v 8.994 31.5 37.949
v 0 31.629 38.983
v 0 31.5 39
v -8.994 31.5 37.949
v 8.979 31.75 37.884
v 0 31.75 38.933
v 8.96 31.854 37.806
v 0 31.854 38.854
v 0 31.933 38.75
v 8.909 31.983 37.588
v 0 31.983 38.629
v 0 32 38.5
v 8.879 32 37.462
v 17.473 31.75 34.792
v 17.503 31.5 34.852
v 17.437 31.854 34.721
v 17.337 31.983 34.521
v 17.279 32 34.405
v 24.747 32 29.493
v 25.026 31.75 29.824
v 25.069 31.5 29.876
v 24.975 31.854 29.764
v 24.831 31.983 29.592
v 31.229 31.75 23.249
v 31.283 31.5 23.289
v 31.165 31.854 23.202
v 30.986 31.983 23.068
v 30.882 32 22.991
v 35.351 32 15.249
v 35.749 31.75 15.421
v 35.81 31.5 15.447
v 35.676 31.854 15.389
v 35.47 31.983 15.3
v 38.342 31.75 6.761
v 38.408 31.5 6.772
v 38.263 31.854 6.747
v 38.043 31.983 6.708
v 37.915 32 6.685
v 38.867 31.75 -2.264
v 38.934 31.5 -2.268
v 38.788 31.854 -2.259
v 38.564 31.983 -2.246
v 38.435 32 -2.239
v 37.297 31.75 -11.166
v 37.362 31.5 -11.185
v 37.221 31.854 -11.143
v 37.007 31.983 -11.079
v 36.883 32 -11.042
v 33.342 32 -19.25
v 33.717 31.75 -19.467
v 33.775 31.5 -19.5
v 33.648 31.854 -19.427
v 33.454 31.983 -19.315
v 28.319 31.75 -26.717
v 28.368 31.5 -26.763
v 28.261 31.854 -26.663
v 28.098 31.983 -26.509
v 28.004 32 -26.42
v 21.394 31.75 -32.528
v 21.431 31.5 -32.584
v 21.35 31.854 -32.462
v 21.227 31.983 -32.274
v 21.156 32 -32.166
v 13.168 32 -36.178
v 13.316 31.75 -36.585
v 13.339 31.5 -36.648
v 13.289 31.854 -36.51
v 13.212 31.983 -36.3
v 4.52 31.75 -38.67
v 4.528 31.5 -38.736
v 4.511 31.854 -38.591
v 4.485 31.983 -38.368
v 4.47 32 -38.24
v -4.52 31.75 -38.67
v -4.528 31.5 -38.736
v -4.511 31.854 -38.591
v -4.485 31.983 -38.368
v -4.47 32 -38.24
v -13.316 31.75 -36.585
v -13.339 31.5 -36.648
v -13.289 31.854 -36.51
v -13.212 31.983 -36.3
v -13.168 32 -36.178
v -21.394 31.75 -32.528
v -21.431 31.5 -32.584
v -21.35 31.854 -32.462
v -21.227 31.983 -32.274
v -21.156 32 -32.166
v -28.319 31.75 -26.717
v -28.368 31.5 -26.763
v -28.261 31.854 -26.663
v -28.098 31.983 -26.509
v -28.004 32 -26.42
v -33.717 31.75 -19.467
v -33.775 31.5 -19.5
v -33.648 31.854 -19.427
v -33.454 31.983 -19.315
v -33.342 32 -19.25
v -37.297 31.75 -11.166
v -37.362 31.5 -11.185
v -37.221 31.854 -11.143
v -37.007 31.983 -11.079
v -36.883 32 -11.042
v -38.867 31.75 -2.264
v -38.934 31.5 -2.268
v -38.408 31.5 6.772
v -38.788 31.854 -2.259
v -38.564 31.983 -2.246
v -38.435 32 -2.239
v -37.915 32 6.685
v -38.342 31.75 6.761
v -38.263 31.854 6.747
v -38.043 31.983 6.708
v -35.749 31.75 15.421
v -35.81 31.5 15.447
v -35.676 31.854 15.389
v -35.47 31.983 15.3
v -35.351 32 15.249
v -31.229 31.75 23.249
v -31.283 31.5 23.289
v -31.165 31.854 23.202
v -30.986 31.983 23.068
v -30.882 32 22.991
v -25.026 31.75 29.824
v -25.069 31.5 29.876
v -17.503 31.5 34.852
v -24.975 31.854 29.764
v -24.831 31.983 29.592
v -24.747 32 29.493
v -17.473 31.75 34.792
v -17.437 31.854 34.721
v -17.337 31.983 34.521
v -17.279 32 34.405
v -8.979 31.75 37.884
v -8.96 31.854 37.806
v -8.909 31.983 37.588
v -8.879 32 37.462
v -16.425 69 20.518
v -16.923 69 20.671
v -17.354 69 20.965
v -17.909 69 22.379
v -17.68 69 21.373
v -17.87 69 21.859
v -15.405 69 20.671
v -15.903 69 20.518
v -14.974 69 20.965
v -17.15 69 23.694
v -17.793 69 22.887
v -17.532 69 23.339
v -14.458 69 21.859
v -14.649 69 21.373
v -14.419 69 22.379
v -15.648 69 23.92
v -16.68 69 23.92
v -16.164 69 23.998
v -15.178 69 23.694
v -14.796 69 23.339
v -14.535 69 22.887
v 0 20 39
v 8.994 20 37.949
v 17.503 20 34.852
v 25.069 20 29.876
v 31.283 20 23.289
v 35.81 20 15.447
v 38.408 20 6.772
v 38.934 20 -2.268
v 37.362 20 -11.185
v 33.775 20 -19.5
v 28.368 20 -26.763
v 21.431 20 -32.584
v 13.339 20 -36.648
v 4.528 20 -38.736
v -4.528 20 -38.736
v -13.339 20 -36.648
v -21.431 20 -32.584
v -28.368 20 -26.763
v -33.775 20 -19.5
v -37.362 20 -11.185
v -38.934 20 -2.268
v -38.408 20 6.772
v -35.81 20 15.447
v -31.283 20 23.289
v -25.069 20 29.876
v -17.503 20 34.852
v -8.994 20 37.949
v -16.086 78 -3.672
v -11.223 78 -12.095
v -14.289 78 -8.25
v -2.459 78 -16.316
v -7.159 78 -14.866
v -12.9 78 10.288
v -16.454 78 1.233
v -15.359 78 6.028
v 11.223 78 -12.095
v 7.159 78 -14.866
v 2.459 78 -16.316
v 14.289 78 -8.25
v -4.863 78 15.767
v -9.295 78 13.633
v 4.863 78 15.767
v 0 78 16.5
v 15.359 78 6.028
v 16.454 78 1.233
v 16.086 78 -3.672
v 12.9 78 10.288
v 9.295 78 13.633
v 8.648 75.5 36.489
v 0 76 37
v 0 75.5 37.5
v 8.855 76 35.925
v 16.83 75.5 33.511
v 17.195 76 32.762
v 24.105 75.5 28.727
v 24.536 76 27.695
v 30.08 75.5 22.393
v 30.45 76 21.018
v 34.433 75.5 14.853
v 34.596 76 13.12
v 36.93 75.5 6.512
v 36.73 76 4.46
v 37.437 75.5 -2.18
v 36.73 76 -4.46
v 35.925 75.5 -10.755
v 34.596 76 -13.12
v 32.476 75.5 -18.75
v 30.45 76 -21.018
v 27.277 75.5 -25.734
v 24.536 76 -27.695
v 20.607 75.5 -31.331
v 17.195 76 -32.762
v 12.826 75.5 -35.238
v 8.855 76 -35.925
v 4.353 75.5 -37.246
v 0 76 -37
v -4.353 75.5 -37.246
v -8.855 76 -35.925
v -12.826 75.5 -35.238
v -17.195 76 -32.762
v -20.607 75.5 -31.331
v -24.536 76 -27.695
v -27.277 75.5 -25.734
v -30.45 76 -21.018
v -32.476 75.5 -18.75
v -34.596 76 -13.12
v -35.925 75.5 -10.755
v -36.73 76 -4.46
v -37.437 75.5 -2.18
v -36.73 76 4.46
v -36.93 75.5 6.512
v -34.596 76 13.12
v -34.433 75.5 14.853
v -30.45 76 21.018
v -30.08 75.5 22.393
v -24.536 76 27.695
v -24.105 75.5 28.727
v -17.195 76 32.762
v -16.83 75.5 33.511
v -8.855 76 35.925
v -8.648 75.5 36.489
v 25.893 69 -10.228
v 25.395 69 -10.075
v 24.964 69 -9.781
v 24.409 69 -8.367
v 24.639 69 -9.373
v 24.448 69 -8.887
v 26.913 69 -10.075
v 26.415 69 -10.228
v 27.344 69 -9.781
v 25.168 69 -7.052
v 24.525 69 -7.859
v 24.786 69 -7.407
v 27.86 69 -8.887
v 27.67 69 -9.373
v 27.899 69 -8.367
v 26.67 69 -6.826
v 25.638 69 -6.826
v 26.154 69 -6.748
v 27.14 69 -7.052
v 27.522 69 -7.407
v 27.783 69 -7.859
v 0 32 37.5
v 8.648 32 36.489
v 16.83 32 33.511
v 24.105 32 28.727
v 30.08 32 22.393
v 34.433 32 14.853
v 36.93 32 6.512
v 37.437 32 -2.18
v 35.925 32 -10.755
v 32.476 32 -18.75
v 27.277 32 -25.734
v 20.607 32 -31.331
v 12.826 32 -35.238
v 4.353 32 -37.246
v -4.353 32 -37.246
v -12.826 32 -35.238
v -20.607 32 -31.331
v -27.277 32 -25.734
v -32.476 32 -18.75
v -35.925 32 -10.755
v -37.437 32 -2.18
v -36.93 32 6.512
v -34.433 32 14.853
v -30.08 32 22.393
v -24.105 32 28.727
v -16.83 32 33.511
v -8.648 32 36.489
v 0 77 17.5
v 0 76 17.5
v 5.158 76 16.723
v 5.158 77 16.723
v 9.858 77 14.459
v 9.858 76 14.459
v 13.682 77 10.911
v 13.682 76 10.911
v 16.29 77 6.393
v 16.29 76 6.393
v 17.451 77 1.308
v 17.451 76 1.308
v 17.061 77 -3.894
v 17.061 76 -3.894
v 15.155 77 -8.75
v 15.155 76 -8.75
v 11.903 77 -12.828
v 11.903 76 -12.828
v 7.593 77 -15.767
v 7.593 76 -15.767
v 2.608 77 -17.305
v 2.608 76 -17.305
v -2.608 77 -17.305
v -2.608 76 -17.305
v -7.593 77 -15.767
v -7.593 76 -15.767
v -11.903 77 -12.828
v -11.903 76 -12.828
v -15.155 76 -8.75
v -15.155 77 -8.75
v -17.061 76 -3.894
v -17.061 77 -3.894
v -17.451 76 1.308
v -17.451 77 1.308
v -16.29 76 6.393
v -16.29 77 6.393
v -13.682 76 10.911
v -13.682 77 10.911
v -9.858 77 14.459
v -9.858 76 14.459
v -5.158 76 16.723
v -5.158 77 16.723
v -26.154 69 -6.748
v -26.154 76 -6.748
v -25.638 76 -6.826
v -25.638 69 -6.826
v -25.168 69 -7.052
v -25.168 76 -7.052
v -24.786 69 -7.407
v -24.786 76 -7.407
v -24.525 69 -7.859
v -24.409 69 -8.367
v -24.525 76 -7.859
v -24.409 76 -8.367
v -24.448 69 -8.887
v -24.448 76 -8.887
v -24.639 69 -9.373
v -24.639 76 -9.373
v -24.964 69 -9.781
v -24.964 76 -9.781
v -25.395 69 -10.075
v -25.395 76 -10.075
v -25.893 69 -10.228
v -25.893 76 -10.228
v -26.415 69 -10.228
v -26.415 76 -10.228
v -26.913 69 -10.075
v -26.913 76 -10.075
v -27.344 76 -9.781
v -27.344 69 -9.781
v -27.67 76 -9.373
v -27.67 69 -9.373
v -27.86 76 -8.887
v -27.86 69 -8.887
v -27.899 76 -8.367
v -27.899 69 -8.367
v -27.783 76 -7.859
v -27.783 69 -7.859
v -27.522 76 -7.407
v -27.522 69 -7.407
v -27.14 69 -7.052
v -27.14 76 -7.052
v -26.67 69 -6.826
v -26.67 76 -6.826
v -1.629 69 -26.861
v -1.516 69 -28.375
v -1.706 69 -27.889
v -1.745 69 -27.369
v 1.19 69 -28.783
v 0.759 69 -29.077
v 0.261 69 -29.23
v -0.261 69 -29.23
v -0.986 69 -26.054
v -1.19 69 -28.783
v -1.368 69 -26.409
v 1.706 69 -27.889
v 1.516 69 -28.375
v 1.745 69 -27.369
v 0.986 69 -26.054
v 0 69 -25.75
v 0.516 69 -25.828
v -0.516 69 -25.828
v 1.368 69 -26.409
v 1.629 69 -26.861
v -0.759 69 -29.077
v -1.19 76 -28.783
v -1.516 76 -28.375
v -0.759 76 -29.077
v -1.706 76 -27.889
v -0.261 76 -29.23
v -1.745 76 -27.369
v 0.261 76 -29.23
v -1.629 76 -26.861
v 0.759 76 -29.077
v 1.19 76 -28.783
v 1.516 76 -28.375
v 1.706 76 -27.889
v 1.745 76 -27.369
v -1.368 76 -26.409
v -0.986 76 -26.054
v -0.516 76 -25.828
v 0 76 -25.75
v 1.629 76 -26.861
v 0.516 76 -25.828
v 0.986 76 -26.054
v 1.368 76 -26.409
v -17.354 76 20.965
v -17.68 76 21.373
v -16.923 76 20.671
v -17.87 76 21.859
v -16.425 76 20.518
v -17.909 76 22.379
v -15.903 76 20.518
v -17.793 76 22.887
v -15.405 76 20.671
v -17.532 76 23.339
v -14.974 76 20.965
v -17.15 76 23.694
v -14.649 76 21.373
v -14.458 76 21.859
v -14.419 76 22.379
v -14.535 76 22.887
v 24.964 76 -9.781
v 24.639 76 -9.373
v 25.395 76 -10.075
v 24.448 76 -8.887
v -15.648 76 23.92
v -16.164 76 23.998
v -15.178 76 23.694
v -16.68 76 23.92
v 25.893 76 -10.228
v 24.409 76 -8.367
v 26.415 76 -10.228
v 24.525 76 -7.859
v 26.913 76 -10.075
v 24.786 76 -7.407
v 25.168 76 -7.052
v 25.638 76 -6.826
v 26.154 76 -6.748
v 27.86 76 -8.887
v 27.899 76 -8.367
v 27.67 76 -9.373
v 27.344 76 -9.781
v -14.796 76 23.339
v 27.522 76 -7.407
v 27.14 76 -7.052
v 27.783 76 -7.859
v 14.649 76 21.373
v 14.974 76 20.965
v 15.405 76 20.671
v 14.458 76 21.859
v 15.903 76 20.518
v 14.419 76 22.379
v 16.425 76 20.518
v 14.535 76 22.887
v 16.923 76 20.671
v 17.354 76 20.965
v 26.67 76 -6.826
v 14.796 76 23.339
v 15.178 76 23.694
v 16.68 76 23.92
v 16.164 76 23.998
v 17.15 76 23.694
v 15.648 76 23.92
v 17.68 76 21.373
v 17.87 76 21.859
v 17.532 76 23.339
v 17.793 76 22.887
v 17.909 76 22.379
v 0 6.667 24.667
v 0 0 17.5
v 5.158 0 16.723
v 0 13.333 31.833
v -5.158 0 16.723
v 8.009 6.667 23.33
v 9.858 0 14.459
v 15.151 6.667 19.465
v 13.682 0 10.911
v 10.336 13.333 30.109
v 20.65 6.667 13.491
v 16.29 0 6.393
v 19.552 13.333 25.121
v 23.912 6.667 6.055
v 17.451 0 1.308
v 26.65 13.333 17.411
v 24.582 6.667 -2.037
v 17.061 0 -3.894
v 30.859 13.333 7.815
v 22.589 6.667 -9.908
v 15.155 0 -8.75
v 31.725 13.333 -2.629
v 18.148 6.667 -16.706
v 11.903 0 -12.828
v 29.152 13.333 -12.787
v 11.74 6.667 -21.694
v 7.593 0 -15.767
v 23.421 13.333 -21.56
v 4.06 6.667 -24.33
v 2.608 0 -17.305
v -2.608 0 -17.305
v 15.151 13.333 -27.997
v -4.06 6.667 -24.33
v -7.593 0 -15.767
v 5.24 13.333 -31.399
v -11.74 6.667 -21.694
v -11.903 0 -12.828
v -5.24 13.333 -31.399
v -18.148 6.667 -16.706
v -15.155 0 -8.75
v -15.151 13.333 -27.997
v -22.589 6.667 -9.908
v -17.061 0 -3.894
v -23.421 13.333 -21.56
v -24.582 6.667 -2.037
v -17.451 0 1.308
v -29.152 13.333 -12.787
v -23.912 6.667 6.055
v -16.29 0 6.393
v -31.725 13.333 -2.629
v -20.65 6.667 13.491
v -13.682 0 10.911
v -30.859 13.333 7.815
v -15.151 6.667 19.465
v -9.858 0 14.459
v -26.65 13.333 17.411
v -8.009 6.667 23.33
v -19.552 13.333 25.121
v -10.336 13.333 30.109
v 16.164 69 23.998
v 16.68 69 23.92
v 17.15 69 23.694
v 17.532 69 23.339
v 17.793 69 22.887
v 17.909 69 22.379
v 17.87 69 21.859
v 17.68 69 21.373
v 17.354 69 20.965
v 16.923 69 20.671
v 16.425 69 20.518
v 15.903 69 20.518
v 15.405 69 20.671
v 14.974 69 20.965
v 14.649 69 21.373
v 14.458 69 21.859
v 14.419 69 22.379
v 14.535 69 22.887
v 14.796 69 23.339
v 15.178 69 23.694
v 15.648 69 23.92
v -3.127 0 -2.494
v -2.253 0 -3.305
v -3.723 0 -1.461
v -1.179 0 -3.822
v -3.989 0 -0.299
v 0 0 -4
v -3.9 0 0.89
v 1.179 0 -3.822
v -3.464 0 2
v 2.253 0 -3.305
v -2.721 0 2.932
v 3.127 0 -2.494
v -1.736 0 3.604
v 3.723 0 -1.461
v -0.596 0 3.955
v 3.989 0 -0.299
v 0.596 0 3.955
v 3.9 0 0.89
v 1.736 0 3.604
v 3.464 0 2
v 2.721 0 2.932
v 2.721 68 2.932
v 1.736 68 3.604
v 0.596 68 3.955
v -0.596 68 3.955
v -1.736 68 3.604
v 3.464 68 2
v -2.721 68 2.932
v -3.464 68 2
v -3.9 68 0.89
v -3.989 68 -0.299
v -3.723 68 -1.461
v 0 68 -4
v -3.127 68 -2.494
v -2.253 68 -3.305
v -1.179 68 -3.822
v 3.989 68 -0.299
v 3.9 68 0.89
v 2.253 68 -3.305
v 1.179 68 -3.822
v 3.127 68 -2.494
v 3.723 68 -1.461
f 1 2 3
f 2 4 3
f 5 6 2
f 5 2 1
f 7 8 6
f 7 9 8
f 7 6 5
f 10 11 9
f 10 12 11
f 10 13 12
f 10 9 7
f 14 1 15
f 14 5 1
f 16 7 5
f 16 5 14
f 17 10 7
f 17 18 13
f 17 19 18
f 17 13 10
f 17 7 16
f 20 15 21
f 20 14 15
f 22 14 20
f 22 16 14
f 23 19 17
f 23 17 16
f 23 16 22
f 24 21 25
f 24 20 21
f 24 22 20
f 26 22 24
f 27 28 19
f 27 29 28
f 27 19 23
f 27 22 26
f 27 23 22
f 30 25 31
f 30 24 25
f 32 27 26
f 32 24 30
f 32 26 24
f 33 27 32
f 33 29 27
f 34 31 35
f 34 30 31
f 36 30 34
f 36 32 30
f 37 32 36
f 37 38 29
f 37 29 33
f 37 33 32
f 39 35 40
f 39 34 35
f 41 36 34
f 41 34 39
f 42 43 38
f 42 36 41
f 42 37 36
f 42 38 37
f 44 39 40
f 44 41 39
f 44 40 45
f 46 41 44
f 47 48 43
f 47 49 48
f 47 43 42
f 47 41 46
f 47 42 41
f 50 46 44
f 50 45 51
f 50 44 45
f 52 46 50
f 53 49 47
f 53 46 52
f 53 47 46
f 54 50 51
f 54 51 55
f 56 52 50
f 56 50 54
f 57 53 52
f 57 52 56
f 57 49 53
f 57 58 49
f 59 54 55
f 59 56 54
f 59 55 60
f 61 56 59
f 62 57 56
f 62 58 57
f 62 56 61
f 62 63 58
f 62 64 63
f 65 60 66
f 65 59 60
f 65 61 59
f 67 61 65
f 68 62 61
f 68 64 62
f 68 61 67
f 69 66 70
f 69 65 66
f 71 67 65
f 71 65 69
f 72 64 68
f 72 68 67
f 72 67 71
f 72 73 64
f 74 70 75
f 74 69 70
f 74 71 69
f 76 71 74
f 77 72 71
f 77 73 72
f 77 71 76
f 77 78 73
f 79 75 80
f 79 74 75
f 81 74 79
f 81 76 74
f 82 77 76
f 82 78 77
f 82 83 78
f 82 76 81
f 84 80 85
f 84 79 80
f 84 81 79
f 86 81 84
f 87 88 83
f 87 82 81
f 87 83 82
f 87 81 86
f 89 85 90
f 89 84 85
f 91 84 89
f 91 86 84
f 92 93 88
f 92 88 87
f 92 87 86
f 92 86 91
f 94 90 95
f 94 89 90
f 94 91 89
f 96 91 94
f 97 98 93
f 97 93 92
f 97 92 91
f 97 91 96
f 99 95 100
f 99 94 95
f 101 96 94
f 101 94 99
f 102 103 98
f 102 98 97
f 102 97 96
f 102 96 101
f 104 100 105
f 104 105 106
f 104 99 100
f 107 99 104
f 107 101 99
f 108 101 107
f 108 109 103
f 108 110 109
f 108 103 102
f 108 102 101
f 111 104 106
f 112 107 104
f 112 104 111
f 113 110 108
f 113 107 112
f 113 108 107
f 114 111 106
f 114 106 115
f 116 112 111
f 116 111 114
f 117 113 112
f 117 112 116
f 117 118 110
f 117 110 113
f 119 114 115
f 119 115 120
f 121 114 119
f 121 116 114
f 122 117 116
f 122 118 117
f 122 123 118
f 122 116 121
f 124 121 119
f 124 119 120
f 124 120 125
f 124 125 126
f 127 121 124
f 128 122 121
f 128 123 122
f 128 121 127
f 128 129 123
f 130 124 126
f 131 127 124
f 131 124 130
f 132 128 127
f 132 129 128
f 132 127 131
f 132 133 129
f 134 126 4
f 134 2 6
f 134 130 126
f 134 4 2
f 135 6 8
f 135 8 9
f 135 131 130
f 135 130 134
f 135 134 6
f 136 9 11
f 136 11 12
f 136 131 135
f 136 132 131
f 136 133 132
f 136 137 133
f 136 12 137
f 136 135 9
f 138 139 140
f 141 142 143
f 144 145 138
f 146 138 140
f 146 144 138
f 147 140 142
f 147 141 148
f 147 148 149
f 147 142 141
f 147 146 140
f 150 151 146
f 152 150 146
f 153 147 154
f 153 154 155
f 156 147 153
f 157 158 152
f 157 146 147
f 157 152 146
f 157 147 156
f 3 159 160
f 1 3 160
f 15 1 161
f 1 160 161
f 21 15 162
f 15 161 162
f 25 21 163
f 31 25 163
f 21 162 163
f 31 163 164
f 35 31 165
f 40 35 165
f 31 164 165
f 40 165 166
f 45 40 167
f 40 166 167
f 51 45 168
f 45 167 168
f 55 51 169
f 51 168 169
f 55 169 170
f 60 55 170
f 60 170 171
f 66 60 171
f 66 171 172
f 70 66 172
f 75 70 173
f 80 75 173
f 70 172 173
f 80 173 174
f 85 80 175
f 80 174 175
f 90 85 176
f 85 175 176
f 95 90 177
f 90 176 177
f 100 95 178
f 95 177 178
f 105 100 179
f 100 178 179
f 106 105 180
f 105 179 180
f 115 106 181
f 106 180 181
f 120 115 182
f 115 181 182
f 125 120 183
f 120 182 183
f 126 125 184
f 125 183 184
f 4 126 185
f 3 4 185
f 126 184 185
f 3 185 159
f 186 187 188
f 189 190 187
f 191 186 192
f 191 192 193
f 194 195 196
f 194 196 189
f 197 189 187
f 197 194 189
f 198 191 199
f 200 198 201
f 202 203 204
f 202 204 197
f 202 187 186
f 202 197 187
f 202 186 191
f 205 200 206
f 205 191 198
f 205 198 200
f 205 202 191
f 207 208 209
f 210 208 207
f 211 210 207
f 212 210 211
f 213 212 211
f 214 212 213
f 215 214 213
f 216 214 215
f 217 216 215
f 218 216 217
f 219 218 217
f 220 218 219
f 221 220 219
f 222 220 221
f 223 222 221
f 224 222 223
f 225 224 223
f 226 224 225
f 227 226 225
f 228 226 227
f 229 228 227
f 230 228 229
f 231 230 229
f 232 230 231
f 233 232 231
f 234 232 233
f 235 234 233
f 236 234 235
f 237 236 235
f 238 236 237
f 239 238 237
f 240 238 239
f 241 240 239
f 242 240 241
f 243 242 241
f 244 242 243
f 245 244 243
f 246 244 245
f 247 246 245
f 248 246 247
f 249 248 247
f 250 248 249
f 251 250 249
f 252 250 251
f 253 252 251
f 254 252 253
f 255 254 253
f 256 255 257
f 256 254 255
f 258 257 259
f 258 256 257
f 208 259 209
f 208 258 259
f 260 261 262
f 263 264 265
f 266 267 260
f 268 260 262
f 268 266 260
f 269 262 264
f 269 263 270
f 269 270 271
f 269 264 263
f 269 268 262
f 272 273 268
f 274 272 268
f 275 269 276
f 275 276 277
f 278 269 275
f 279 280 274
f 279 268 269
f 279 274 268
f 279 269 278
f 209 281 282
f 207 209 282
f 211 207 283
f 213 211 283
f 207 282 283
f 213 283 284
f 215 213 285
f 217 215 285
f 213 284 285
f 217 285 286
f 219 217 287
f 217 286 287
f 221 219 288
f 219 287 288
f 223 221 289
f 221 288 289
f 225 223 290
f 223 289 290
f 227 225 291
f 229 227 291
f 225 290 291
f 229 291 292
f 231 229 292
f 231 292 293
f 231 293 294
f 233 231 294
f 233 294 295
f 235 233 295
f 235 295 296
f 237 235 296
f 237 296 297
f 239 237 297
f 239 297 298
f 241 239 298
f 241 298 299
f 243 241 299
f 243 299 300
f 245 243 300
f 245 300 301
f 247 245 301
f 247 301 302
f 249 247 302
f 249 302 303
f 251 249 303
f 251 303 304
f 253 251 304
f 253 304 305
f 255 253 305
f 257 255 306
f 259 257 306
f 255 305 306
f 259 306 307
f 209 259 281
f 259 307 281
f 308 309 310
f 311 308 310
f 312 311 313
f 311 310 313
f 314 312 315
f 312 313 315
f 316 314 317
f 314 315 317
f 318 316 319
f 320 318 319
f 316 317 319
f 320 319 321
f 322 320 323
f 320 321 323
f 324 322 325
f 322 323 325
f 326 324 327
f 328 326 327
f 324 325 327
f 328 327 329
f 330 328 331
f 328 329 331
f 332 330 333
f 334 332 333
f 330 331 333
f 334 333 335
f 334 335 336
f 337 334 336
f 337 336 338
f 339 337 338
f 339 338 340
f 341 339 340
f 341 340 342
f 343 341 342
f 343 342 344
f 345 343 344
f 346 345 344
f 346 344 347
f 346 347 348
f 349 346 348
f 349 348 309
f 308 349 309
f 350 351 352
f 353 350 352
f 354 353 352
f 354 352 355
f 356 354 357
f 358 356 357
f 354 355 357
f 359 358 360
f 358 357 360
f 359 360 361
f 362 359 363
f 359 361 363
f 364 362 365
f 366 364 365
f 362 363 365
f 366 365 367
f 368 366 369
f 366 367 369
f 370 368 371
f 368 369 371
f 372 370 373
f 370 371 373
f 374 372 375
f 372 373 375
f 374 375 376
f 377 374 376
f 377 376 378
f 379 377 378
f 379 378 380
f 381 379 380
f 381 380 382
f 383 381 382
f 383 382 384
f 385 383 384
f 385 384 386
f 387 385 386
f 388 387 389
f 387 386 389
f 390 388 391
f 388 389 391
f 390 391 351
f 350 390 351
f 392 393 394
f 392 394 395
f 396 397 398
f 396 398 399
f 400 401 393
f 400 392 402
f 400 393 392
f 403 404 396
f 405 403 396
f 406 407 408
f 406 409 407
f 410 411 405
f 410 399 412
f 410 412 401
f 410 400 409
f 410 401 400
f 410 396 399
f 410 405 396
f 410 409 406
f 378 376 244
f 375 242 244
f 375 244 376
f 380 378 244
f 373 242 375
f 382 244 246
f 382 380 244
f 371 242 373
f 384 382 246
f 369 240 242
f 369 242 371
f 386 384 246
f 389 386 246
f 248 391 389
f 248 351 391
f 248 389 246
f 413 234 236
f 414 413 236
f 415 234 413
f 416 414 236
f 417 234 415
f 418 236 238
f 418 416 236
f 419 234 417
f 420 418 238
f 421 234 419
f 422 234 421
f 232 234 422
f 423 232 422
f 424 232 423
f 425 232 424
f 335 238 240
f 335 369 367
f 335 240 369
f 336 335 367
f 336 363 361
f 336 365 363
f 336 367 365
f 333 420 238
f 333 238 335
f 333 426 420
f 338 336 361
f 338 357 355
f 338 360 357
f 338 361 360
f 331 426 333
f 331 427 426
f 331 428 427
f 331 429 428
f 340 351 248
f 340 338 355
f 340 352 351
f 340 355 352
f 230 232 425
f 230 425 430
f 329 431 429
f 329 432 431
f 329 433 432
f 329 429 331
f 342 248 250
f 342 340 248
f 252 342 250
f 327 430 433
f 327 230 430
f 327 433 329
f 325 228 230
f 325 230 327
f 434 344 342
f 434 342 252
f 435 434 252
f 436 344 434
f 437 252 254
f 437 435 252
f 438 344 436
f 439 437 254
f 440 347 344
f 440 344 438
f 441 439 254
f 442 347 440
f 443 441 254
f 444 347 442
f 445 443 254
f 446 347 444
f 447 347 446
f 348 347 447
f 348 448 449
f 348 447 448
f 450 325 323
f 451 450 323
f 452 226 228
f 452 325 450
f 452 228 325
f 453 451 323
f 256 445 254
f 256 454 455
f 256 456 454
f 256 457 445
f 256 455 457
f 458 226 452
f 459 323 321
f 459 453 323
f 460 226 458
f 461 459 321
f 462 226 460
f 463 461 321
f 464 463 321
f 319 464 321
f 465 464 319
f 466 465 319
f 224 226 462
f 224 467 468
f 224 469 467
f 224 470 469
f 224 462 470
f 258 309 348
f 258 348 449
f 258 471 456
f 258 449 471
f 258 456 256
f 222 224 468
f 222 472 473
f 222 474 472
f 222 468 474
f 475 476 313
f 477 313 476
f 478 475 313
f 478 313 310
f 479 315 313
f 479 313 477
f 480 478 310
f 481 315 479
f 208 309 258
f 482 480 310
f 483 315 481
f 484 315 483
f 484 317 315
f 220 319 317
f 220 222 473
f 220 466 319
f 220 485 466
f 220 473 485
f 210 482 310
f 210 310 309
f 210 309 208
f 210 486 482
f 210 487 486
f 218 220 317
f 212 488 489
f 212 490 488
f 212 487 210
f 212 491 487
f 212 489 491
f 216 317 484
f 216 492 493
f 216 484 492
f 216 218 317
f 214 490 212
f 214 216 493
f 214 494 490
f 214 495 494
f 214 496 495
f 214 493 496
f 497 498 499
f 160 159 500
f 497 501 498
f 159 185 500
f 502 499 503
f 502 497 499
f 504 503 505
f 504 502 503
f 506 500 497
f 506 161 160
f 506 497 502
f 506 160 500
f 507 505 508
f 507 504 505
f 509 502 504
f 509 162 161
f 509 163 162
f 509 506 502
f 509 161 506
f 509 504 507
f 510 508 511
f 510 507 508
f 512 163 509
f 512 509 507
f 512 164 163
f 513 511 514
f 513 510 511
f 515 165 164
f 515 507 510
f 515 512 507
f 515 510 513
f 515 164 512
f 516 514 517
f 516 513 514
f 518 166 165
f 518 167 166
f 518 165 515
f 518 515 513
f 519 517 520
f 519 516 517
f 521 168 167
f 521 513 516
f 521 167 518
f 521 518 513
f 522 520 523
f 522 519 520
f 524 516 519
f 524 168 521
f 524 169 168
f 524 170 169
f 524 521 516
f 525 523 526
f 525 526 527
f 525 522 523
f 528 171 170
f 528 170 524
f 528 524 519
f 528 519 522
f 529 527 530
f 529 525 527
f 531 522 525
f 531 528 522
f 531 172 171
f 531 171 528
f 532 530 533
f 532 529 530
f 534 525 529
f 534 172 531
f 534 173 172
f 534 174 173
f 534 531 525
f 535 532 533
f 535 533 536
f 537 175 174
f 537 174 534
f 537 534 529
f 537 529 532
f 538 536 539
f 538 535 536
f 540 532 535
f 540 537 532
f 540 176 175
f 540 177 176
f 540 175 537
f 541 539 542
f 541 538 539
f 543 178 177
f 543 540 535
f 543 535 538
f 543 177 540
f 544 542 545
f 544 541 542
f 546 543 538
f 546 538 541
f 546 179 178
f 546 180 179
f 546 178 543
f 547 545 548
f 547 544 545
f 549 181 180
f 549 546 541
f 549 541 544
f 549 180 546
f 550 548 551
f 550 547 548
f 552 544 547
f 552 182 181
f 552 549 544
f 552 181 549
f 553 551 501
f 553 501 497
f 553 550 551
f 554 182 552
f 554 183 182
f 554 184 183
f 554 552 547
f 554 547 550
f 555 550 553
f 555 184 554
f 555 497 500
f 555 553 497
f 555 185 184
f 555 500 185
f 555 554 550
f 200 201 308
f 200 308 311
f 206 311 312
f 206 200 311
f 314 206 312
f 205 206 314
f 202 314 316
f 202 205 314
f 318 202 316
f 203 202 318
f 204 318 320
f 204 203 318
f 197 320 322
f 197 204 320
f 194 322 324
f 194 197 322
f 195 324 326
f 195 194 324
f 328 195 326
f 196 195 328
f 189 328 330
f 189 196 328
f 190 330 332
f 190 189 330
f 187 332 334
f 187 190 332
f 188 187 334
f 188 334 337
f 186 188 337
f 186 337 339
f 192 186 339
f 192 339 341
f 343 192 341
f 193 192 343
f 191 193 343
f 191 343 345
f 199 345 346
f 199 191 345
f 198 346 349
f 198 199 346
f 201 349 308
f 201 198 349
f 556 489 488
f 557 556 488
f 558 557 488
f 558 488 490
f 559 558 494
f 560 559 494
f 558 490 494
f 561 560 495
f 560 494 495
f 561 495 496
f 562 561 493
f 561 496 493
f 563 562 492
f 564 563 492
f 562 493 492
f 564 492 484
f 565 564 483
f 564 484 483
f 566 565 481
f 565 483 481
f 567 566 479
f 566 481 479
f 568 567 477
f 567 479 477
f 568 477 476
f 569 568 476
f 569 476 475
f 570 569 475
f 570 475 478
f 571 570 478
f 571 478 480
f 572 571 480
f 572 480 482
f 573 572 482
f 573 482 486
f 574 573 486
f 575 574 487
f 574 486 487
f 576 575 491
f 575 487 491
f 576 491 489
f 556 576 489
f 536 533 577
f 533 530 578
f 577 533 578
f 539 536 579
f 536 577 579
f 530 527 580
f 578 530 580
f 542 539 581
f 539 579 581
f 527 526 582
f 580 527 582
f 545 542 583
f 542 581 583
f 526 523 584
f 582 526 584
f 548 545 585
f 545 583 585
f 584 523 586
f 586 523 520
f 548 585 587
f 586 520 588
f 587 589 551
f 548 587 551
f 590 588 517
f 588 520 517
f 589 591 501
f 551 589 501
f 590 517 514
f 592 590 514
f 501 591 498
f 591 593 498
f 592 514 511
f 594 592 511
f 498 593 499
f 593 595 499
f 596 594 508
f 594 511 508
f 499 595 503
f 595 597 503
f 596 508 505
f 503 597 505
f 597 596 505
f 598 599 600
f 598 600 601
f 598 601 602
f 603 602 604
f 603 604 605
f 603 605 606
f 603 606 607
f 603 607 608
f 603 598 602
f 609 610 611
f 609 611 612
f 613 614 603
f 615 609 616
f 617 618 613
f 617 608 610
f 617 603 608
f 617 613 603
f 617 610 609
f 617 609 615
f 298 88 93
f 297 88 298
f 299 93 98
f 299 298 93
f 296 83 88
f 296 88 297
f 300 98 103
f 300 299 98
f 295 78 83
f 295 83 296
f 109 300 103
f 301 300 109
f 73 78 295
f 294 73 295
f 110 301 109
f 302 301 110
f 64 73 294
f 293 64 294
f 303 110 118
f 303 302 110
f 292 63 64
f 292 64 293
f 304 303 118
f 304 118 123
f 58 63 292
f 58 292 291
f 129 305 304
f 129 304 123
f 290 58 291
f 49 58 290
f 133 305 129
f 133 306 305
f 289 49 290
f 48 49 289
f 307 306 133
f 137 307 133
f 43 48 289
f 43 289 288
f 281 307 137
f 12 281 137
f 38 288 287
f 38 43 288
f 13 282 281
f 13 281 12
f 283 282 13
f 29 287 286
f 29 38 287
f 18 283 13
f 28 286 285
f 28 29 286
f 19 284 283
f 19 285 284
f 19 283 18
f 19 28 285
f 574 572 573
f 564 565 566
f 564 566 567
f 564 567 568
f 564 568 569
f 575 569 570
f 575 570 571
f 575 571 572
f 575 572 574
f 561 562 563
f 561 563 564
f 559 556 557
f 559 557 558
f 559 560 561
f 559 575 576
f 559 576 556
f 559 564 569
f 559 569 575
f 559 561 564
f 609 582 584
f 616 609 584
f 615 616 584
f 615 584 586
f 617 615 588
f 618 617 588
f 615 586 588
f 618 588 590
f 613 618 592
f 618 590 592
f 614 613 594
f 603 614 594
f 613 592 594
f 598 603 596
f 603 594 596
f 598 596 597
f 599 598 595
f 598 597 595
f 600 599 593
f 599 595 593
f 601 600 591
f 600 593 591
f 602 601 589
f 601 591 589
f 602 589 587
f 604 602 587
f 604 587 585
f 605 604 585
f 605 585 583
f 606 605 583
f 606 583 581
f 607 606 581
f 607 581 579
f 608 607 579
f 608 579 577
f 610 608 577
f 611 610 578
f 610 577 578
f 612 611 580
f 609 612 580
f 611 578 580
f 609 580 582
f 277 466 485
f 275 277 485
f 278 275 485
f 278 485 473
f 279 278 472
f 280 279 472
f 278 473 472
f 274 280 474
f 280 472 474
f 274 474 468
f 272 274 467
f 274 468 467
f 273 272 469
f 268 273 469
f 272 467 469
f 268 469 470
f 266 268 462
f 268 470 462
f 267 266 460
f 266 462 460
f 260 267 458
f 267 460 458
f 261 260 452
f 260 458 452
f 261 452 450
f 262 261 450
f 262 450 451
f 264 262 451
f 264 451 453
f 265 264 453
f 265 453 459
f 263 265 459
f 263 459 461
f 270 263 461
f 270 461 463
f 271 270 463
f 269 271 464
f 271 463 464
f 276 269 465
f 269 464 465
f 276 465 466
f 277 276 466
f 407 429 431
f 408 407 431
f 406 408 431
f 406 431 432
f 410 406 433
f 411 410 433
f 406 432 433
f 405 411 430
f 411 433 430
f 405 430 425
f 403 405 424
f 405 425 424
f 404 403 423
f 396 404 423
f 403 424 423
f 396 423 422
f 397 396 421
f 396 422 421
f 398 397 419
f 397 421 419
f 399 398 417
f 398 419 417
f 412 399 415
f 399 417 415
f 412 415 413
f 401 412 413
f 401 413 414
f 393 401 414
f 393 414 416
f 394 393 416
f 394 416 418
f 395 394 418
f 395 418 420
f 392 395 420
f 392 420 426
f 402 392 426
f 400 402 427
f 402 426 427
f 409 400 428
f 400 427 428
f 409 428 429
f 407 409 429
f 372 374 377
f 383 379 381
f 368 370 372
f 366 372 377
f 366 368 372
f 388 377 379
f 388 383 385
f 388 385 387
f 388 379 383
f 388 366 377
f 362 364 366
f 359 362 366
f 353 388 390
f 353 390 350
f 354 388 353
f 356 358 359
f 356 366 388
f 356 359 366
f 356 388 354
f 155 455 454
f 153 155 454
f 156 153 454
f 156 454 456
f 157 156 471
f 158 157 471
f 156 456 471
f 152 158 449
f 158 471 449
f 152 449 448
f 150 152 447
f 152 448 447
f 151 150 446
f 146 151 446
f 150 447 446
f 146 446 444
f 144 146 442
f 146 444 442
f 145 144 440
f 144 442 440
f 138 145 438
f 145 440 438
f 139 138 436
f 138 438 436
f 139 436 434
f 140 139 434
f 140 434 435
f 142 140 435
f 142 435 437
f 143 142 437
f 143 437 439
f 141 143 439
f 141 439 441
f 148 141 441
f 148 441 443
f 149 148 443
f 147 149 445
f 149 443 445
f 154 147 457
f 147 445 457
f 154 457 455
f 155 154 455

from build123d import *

# Parameters (mm, degrees)
SKETCH1_R           = 37.5
SKETCH1_R_2         = 17.5
BOSS_EXTRUDE1_DEPTH = 76
SKETCH1_3_R         = 17.5
BOSS_EXTRUDE2_DEPTH = 78
SKETCH1_4_R         = 39
SKETCH1_4_R_2       = 37.5
BOSS_EXTRUDE3_DEPTH = 32
SKETCH2_R           = 1.75
CUT_EXTRUDE1_DEPTH  = 7
FILLET1_R           = 0.5
CHAMFER1_SIZE       = 0.5
CHAMFER2_SIZE       = 21.5
CHAMFER2_SIZE2      = 20
CHAMFER3_SIZE       = 1
SKETCH4_R           = 4
CUT_EXTRUDE2_DEPTH  = 68


with BuildPart() as part:
    # Sketch1 → Boss-Extrude1 (new body)
    with BuildSketch(Plane(origin=(0, 0, 0), x_dir=(1, 0, 0), z_dir=(0, 1, 0))):
        with Locations(Location((0, 0, 0), (0, 0, 270))):
            Circle(SKETCH1_R)
        with Locations(Location((0, 0, 0), (0, 0, 270))):
            Circle(SKETCH1_R_2, mode=Mode.SUBTRACT)
    extrude(amount=BOSS_EXTRUDE1_DEPTH)

    # Sketch1<3> → Boss-Extrude2 (add)
    with BuildSketch(Plane(origin=(0, 0, 0), x_dir=(1, 0, 0), z_dir=(0, 1, 0))):
        with Locations(Location((0, 0, 0), (0, 0, 270))):
            Circle(SKETCH1_3_R)
    extrude(amount=BOSS_EXTRUDE2_DEPTH)

    # Sketch1<4> → Boss-Extrude3 (add)
    with BuildSketch(Plane(origin=(0, 0, 0), x_dir=(1, 0, 0), z_dir=(0, 1, 0))):
        with Locations(Location((0, 0, 0), (0, 0, 270))):
            Circle(SKETCH1_4_R)
        with Locations(Location((0, 0, 0), (0, 0, 270))):
            Circle(SKETCH1_4_R_2, mode=Mode.SUBTRACT)
    extrude(amount=BOSS_EXTRUDE3_DEPTH)

    # Sketch2 → Cut-Extrude1 (cut)
    with BuildSketch(Plane(origin=(0, 76, 0), x_dir=(1, 0, 0), z_dir=(0, 1, 0))):
        with Locations(Location((0, 27.5, 0), (0, 0, 270))):
            Circle(SKETCH2_R)
        with Locations(Location((26.154054198, 8.497967345, 0), (0, 0, 270))):
            Circle(SKETCH2_R)
        with Locations(Location((16.164094438, -22.247967345, 0), (0, 0, 270))):
            Circle(SKETCH2_R)
        with Locations(Location((-16.164094438, -22.247967345, 0), (0, 0, 270))):
            Circle(SKETCH2_R)
        with Locations(Location((-26.154054198, 8.497967345, 0), (0, 0, 270))):
            Circle(SKETCH2_R)
    extrude(amount=-CUT_EXTRUDE1_DEPTH, mode=Mode.SUBTRACT)

    # Fillet1
    fillet1_edges = [part.edges().sort_by_distance(p)[0] for p in [
        (0, 32, -39),
    ]]
    fillet(fillet1_edges, radius=FILLET1_R)

    # Chamfer1
    chamfer1_edges = [part.edges().sort_by_distance(p)[0] for p in [
        (0, 76, -37.5),
    ]]
    chamfer(chamfer1_edges, length=CHAMFER1_SIZE)

    # Chamfer2
    chamfer2_edges = [part.edges().sort_by_distance(p)[0] for p in [
        (0, 0, -39),
    ]]
    chamfer2_side = [part.faces().sort_by_distance(p)[0] for p in [
        (0, 0, 0),
    ]]
    chamfer(chamfer2_edges, length=CHAMFER2_SIZE, length2=CHAMFER2_SIZE2, reference=chamfer2_side[0])

    # Chamfer3
    chamfer3_edges = [part.edges().sort_by_distance(p)[0] for p in [
        (0, 78, -17.5),
    ]]
    chamfer(chamfer3_edges, length=CHAMFER3_SIZE)

    # Sketch4 → Cut-Extrude2 (cut)
    with BuildSketch(Plane.XZ):
        with Locations(Location((0, 0, 0), (0, 0, 270))):
            Circle(SKETCH4_R)
    extrude(amount=-CUT_EXTRUDE2_DEPTH, mode=Mode.SUBTRACT)


solid = part.part
